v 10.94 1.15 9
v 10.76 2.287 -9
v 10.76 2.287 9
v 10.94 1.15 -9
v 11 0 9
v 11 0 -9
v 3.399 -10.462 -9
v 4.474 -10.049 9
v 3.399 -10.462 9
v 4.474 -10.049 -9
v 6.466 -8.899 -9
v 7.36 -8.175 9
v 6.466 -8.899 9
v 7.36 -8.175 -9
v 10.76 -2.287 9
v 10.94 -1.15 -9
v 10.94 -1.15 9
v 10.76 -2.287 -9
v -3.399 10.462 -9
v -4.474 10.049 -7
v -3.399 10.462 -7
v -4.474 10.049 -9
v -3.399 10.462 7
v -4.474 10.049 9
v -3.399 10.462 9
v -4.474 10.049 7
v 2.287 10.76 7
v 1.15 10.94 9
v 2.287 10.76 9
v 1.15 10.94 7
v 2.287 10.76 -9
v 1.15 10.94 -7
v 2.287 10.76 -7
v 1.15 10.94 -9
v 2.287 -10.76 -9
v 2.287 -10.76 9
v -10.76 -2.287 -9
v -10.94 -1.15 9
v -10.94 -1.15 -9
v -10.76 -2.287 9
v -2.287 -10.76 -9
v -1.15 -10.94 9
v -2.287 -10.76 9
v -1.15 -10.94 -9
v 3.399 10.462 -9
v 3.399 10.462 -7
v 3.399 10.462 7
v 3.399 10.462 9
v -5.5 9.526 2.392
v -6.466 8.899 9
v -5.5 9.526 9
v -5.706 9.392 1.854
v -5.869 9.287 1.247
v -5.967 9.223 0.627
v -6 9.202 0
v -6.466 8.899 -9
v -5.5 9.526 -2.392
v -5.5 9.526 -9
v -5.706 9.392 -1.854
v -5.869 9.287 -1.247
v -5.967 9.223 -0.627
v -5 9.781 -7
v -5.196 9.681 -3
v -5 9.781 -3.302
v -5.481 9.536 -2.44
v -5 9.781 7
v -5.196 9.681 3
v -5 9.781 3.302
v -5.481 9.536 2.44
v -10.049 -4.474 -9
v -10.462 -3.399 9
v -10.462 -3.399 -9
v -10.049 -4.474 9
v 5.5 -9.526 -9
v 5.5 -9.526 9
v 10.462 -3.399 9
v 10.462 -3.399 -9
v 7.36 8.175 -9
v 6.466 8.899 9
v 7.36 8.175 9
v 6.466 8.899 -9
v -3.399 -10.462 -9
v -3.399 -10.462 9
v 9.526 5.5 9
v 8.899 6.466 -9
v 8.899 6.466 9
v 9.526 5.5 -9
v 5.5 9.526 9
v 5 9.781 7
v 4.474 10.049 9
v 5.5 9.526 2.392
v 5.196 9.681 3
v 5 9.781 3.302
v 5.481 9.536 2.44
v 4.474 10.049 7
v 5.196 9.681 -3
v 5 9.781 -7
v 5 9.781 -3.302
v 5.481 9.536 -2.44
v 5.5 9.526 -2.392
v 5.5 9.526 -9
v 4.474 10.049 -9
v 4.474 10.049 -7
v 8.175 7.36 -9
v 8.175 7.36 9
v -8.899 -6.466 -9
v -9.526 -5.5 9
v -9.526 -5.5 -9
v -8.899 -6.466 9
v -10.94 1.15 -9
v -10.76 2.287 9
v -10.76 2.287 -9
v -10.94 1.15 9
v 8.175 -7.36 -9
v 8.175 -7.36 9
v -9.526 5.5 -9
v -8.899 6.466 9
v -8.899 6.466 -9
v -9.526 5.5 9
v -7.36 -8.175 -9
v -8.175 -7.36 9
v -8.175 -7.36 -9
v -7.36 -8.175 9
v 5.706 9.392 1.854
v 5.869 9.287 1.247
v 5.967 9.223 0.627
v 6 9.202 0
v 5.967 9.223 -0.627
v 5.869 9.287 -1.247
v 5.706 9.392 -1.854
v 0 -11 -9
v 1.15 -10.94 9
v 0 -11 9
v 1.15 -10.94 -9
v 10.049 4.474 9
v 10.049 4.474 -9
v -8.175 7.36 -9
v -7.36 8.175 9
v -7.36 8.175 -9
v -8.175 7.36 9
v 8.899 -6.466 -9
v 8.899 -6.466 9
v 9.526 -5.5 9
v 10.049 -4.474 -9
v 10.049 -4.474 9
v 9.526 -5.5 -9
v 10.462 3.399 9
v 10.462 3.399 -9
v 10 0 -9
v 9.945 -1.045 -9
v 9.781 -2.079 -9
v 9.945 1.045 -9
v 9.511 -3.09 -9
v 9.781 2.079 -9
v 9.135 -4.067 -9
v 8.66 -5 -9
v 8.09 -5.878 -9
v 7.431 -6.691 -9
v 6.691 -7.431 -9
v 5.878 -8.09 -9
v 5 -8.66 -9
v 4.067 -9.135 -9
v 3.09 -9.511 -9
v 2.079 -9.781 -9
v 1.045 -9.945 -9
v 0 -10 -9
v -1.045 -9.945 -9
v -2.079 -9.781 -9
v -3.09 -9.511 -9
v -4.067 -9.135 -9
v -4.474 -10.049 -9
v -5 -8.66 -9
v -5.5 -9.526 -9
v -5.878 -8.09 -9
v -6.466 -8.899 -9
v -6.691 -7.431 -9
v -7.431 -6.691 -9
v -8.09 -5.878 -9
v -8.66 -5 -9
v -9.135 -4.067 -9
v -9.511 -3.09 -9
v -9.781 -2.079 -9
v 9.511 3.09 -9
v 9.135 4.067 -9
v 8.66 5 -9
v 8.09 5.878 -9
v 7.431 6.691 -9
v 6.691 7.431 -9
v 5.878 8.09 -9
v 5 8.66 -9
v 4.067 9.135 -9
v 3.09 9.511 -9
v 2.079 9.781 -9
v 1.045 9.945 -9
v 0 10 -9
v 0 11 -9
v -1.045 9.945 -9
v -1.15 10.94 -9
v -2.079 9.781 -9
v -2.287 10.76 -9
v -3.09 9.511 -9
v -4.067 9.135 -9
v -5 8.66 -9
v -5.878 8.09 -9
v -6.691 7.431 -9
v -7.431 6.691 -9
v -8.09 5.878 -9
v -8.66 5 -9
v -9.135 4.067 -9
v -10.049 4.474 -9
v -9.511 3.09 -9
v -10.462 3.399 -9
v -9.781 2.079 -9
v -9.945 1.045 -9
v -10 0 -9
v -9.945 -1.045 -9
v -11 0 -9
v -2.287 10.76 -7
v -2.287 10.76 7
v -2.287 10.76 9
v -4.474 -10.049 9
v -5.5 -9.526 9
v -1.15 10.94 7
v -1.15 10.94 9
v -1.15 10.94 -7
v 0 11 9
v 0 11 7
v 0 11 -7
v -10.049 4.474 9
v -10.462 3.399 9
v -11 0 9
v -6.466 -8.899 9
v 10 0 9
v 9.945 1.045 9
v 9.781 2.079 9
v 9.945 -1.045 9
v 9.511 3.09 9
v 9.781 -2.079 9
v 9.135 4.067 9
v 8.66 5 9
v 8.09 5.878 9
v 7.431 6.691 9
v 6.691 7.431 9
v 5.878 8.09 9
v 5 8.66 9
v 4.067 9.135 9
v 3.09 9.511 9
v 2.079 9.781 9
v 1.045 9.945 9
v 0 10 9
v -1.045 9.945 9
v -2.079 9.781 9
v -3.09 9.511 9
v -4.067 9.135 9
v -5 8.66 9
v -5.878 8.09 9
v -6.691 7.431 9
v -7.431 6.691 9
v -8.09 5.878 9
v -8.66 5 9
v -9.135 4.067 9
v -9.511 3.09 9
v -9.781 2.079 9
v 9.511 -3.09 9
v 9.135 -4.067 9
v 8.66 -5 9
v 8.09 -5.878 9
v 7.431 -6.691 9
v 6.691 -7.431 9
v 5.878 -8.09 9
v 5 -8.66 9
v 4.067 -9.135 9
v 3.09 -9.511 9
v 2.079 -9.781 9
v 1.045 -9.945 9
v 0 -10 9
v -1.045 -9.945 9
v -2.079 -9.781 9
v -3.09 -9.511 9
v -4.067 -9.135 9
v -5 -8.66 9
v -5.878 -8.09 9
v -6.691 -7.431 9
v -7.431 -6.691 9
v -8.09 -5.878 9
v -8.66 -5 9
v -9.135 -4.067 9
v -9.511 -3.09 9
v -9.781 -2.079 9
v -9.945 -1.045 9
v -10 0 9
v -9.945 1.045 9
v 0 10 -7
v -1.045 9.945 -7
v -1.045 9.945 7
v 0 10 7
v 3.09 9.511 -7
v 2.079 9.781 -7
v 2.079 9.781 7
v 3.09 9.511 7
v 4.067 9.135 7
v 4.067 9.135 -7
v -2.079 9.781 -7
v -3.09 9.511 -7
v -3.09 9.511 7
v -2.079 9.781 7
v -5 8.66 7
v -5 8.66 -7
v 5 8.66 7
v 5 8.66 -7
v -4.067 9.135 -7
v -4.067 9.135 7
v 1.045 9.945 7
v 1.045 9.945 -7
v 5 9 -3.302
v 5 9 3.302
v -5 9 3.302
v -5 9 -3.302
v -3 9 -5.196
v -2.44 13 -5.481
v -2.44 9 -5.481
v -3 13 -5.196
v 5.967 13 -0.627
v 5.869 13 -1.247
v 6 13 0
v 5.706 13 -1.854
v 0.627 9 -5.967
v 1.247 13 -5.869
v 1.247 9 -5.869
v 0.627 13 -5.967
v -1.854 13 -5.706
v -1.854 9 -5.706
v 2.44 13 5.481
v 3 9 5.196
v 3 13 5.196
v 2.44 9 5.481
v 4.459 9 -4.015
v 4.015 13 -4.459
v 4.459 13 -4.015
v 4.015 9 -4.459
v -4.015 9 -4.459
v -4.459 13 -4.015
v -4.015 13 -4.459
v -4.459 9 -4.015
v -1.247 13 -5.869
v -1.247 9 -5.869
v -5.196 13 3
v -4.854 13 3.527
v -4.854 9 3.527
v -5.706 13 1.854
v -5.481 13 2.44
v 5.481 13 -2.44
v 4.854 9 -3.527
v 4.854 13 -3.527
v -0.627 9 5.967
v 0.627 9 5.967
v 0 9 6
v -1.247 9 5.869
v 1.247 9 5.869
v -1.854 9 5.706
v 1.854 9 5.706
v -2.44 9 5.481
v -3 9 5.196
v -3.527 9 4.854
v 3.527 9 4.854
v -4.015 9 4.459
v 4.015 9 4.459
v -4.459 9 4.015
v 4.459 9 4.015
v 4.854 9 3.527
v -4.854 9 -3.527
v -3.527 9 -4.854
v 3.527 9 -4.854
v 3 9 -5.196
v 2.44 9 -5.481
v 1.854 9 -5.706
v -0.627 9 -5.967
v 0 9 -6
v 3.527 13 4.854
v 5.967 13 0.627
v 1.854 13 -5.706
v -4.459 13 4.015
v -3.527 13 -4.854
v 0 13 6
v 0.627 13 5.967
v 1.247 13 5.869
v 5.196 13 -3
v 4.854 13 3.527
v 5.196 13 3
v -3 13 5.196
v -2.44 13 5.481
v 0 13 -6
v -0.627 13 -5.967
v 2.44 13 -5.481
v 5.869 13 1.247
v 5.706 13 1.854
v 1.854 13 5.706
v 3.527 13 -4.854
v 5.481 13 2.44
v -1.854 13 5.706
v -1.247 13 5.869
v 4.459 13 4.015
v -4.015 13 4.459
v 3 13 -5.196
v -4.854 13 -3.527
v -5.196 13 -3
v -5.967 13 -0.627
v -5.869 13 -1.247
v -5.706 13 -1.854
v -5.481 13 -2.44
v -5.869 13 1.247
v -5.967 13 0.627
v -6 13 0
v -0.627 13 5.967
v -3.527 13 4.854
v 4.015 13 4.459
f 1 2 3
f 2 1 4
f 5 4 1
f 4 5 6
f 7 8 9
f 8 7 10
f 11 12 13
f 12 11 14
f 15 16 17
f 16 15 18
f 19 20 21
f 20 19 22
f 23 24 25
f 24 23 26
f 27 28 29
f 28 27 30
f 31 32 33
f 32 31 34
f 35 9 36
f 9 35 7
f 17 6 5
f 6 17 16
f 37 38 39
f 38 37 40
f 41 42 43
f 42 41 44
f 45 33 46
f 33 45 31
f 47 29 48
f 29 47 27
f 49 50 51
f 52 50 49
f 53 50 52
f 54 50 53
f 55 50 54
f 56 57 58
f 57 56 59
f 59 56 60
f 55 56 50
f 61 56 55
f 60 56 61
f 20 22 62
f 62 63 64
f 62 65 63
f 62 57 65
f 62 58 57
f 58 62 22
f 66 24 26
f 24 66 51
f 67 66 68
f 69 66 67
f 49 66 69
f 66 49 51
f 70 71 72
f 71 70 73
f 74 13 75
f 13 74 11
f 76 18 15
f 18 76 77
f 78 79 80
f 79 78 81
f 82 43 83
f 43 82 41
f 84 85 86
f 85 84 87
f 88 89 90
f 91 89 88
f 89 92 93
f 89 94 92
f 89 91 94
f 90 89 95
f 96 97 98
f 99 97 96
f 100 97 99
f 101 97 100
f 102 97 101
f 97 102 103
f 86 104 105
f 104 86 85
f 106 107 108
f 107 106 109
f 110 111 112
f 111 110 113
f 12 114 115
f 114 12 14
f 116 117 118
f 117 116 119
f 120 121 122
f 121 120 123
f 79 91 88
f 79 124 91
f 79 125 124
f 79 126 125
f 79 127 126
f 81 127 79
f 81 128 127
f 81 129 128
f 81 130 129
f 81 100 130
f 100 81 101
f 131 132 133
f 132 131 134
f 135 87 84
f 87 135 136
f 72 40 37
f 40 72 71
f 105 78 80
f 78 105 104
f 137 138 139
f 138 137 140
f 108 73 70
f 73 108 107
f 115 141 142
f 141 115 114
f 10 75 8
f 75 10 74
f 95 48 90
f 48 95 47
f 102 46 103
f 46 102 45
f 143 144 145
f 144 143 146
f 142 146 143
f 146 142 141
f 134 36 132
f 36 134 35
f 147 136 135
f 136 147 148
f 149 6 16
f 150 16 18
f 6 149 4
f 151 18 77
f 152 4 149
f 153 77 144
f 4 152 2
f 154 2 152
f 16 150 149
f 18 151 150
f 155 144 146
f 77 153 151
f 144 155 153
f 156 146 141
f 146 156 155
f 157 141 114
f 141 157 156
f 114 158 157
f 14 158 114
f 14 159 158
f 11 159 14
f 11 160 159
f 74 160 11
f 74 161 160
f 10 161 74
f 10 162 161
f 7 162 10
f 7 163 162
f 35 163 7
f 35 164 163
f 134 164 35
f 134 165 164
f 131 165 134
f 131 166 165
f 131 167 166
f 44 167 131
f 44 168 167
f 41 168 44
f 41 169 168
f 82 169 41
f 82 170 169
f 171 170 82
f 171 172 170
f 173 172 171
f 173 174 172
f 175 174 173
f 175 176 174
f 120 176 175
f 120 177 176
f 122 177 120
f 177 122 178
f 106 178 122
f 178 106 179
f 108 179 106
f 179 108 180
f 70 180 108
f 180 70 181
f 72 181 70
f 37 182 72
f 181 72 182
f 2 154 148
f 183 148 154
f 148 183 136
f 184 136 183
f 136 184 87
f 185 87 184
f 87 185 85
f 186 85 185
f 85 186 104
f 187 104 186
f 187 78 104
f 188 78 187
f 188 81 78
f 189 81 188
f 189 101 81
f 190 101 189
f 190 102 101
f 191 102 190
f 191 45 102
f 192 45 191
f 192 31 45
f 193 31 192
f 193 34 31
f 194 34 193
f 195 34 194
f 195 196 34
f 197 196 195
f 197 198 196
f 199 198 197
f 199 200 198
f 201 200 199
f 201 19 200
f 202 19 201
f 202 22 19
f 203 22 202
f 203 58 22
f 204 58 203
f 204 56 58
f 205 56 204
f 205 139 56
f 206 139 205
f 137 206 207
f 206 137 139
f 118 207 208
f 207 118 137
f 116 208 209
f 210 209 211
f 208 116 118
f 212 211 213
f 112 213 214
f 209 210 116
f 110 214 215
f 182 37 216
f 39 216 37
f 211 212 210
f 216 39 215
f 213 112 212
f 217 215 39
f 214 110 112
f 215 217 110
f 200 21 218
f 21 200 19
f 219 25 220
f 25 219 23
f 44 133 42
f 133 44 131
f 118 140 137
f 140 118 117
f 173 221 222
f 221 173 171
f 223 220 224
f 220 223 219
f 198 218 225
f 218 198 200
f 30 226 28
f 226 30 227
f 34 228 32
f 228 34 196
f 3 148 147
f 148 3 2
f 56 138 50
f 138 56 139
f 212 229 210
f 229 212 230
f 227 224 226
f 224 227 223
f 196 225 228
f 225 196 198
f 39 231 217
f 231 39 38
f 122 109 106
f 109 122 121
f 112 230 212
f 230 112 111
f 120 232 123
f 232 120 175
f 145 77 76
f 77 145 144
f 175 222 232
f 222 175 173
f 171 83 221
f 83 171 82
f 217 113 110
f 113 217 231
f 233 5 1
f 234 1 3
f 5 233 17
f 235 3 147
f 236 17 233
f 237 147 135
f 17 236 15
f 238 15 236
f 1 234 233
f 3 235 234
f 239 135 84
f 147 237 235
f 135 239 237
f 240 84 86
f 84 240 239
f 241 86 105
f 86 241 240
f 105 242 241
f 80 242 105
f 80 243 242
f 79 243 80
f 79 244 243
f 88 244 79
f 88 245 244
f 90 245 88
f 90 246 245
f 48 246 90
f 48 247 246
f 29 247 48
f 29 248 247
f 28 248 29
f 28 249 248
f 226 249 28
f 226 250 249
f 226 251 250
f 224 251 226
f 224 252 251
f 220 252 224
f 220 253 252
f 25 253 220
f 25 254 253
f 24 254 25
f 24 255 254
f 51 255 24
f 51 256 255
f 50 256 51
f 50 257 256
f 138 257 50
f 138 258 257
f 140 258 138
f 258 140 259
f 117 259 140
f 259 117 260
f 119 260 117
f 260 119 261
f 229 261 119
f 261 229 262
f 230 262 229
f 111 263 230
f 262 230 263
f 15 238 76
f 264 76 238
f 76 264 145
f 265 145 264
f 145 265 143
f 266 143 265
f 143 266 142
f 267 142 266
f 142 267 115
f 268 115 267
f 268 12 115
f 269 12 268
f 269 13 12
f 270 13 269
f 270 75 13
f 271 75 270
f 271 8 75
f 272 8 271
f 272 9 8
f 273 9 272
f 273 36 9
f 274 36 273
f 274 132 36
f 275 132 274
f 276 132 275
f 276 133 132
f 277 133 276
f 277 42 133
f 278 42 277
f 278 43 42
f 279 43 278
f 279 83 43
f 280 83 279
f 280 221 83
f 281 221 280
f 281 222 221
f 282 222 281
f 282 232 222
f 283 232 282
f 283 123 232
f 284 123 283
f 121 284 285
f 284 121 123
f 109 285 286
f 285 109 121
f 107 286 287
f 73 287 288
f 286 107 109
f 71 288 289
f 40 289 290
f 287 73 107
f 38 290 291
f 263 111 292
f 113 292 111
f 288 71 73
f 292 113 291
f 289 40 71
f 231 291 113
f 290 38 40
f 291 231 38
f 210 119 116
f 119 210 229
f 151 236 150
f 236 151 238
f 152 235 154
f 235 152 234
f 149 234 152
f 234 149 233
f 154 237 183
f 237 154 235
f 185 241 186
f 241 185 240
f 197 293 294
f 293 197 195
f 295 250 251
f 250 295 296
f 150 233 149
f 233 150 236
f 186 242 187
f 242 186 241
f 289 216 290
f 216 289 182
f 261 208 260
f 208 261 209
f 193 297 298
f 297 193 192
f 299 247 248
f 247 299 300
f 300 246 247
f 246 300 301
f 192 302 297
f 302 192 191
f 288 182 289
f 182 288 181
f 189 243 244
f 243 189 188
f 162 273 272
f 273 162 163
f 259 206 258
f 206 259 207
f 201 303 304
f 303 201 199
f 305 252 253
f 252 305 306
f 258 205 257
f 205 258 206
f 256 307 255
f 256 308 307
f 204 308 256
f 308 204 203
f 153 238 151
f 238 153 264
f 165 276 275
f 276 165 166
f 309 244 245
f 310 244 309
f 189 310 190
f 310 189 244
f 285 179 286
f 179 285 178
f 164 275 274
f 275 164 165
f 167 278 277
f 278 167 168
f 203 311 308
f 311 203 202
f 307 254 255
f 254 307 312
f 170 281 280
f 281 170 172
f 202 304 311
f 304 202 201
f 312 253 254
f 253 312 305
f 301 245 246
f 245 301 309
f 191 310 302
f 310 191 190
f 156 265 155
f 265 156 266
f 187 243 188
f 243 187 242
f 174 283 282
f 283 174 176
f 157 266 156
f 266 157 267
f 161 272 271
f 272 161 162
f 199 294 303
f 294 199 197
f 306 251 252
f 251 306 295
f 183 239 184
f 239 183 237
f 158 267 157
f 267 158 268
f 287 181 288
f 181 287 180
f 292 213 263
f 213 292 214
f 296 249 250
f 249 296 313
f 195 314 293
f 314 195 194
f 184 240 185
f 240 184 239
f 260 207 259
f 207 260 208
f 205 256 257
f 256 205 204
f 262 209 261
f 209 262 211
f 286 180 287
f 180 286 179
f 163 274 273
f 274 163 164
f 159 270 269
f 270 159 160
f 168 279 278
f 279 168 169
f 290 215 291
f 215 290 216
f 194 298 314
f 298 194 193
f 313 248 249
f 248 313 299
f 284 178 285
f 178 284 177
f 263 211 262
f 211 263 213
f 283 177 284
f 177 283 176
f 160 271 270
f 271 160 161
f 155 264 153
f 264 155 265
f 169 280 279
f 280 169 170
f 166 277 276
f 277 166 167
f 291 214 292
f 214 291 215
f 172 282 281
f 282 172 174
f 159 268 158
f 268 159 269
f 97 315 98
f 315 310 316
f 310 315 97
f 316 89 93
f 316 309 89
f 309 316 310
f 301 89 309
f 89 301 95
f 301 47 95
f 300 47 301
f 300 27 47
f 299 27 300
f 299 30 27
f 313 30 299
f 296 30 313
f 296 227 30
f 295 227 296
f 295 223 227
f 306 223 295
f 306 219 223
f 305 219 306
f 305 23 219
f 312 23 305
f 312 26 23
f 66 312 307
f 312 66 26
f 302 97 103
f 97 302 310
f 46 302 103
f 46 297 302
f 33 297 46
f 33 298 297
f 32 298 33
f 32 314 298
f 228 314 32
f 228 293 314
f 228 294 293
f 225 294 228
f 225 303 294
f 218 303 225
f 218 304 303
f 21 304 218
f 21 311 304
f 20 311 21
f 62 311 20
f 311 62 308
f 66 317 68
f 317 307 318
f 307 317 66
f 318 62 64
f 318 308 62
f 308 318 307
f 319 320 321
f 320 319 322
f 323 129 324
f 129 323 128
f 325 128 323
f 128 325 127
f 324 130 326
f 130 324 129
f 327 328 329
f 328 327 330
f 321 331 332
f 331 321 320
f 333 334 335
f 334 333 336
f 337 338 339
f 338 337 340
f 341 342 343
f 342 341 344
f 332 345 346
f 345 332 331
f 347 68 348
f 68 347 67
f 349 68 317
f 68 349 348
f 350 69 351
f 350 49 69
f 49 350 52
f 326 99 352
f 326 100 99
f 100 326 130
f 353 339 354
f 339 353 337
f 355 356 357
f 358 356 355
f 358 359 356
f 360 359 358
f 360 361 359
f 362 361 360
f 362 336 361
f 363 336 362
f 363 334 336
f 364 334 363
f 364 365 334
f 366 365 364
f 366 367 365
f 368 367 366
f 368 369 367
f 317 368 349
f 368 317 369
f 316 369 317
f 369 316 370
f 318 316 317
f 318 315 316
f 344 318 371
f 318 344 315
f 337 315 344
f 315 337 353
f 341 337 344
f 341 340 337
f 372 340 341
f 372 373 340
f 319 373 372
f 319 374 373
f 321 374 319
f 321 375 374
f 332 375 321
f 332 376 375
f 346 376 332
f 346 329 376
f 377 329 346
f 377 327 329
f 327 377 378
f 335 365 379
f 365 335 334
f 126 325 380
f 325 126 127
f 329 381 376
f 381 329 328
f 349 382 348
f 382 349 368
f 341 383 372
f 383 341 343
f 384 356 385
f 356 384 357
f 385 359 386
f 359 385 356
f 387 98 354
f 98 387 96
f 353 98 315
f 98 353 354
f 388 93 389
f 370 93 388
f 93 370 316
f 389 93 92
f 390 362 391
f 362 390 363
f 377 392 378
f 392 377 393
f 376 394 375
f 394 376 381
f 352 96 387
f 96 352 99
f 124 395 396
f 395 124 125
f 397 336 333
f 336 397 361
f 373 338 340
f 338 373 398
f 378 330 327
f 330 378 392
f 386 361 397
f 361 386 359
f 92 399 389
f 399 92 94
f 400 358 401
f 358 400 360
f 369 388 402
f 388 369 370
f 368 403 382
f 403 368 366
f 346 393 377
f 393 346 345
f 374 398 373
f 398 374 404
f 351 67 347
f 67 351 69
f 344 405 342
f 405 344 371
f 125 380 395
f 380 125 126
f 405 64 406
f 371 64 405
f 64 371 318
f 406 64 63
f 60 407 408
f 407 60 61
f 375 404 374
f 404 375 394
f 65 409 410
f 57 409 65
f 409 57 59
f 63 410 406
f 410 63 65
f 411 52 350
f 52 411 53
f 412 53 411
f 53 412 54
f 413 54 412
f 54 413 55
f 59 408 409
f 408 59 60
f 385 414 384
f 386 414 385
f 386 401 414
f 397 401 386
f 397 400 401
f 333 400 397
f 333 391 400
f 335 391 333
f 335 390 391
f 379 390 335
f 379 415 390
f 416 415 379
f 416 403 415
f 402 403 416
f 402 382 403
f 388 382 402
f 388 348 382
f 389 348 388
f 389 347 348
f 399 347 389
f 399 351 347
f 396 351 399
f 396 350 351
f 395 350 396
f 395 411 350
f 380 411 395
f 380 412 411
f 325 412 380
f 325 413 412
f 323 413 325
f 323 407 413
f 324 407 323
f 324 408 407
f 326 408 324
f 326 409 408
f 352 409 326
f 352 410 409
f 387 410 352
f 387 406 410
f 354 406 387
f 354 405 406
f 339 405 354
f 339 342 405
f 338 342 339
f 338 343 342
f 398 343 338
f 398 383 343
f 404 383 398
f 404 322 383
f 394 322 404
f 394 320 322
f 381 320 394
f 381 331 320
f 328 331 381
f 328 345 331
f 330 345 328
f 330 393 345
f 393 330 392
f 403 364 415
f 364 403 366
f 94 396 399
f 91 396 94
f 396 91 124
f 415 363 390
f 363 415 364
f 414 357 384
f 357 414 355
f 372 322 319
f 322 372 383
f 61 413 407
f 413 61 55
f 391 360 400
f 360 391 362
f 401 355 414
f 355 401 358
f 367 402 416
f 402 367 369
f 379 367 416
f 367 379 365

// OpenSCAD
H = 18;
D_INNER = 22;
D_OUTER = 26;
D_SWITCH = 12;

EPS = 0.01;
EPS2 = EPS*2;

CARR_X = 10;
CARR_Z = H - 4;

$fn = 60;

// Body.
*difference() {
	translate([0, 0, -H/2])	cylinder(h=H, d=D_OUTER);
	translate([0, 0, -H/2])	cylinder(h=H, d=D_INNER);
	rotate([-90, 0, 0]) {
		cylinder(h=D_OUTER, d=D_SWITCH);
	}	
}

// Payload
color("yellow") {
	rotate([-90, 0, 0]) {
		translate([0, 0, D_INNER/2-2]) cylinder(h=4, d=D_SWITCH);
	}	
}

// Carriage
*color("green") intersection() {
	translate([0, 0, -H/2])	cylinder(h=H, d=D_INNER);
	difference() {
		translate([-CARR_X/2, 0, -H/2 + (H - CARR_Z)/2]) cube(size=[10, 20, H-4]);
		translate([-4, 1, -H/2-EPS]) cube(size=[8, 5, H+EPS2]);
	}
}

// Holding ring
color("blue") difference() {
	difference() {
		translate([0, 0, -H/2])	cylinder(h=H, d=D_INNER);
		translate([0, 0, -H/2])	cylinder(h=H, d=D_INNER-2);
	}
	translate([-CARR_X/2, 0, -H/2 + (H - CARR_Z)/2]) cube(size=[10, 20, H-4]);
}
